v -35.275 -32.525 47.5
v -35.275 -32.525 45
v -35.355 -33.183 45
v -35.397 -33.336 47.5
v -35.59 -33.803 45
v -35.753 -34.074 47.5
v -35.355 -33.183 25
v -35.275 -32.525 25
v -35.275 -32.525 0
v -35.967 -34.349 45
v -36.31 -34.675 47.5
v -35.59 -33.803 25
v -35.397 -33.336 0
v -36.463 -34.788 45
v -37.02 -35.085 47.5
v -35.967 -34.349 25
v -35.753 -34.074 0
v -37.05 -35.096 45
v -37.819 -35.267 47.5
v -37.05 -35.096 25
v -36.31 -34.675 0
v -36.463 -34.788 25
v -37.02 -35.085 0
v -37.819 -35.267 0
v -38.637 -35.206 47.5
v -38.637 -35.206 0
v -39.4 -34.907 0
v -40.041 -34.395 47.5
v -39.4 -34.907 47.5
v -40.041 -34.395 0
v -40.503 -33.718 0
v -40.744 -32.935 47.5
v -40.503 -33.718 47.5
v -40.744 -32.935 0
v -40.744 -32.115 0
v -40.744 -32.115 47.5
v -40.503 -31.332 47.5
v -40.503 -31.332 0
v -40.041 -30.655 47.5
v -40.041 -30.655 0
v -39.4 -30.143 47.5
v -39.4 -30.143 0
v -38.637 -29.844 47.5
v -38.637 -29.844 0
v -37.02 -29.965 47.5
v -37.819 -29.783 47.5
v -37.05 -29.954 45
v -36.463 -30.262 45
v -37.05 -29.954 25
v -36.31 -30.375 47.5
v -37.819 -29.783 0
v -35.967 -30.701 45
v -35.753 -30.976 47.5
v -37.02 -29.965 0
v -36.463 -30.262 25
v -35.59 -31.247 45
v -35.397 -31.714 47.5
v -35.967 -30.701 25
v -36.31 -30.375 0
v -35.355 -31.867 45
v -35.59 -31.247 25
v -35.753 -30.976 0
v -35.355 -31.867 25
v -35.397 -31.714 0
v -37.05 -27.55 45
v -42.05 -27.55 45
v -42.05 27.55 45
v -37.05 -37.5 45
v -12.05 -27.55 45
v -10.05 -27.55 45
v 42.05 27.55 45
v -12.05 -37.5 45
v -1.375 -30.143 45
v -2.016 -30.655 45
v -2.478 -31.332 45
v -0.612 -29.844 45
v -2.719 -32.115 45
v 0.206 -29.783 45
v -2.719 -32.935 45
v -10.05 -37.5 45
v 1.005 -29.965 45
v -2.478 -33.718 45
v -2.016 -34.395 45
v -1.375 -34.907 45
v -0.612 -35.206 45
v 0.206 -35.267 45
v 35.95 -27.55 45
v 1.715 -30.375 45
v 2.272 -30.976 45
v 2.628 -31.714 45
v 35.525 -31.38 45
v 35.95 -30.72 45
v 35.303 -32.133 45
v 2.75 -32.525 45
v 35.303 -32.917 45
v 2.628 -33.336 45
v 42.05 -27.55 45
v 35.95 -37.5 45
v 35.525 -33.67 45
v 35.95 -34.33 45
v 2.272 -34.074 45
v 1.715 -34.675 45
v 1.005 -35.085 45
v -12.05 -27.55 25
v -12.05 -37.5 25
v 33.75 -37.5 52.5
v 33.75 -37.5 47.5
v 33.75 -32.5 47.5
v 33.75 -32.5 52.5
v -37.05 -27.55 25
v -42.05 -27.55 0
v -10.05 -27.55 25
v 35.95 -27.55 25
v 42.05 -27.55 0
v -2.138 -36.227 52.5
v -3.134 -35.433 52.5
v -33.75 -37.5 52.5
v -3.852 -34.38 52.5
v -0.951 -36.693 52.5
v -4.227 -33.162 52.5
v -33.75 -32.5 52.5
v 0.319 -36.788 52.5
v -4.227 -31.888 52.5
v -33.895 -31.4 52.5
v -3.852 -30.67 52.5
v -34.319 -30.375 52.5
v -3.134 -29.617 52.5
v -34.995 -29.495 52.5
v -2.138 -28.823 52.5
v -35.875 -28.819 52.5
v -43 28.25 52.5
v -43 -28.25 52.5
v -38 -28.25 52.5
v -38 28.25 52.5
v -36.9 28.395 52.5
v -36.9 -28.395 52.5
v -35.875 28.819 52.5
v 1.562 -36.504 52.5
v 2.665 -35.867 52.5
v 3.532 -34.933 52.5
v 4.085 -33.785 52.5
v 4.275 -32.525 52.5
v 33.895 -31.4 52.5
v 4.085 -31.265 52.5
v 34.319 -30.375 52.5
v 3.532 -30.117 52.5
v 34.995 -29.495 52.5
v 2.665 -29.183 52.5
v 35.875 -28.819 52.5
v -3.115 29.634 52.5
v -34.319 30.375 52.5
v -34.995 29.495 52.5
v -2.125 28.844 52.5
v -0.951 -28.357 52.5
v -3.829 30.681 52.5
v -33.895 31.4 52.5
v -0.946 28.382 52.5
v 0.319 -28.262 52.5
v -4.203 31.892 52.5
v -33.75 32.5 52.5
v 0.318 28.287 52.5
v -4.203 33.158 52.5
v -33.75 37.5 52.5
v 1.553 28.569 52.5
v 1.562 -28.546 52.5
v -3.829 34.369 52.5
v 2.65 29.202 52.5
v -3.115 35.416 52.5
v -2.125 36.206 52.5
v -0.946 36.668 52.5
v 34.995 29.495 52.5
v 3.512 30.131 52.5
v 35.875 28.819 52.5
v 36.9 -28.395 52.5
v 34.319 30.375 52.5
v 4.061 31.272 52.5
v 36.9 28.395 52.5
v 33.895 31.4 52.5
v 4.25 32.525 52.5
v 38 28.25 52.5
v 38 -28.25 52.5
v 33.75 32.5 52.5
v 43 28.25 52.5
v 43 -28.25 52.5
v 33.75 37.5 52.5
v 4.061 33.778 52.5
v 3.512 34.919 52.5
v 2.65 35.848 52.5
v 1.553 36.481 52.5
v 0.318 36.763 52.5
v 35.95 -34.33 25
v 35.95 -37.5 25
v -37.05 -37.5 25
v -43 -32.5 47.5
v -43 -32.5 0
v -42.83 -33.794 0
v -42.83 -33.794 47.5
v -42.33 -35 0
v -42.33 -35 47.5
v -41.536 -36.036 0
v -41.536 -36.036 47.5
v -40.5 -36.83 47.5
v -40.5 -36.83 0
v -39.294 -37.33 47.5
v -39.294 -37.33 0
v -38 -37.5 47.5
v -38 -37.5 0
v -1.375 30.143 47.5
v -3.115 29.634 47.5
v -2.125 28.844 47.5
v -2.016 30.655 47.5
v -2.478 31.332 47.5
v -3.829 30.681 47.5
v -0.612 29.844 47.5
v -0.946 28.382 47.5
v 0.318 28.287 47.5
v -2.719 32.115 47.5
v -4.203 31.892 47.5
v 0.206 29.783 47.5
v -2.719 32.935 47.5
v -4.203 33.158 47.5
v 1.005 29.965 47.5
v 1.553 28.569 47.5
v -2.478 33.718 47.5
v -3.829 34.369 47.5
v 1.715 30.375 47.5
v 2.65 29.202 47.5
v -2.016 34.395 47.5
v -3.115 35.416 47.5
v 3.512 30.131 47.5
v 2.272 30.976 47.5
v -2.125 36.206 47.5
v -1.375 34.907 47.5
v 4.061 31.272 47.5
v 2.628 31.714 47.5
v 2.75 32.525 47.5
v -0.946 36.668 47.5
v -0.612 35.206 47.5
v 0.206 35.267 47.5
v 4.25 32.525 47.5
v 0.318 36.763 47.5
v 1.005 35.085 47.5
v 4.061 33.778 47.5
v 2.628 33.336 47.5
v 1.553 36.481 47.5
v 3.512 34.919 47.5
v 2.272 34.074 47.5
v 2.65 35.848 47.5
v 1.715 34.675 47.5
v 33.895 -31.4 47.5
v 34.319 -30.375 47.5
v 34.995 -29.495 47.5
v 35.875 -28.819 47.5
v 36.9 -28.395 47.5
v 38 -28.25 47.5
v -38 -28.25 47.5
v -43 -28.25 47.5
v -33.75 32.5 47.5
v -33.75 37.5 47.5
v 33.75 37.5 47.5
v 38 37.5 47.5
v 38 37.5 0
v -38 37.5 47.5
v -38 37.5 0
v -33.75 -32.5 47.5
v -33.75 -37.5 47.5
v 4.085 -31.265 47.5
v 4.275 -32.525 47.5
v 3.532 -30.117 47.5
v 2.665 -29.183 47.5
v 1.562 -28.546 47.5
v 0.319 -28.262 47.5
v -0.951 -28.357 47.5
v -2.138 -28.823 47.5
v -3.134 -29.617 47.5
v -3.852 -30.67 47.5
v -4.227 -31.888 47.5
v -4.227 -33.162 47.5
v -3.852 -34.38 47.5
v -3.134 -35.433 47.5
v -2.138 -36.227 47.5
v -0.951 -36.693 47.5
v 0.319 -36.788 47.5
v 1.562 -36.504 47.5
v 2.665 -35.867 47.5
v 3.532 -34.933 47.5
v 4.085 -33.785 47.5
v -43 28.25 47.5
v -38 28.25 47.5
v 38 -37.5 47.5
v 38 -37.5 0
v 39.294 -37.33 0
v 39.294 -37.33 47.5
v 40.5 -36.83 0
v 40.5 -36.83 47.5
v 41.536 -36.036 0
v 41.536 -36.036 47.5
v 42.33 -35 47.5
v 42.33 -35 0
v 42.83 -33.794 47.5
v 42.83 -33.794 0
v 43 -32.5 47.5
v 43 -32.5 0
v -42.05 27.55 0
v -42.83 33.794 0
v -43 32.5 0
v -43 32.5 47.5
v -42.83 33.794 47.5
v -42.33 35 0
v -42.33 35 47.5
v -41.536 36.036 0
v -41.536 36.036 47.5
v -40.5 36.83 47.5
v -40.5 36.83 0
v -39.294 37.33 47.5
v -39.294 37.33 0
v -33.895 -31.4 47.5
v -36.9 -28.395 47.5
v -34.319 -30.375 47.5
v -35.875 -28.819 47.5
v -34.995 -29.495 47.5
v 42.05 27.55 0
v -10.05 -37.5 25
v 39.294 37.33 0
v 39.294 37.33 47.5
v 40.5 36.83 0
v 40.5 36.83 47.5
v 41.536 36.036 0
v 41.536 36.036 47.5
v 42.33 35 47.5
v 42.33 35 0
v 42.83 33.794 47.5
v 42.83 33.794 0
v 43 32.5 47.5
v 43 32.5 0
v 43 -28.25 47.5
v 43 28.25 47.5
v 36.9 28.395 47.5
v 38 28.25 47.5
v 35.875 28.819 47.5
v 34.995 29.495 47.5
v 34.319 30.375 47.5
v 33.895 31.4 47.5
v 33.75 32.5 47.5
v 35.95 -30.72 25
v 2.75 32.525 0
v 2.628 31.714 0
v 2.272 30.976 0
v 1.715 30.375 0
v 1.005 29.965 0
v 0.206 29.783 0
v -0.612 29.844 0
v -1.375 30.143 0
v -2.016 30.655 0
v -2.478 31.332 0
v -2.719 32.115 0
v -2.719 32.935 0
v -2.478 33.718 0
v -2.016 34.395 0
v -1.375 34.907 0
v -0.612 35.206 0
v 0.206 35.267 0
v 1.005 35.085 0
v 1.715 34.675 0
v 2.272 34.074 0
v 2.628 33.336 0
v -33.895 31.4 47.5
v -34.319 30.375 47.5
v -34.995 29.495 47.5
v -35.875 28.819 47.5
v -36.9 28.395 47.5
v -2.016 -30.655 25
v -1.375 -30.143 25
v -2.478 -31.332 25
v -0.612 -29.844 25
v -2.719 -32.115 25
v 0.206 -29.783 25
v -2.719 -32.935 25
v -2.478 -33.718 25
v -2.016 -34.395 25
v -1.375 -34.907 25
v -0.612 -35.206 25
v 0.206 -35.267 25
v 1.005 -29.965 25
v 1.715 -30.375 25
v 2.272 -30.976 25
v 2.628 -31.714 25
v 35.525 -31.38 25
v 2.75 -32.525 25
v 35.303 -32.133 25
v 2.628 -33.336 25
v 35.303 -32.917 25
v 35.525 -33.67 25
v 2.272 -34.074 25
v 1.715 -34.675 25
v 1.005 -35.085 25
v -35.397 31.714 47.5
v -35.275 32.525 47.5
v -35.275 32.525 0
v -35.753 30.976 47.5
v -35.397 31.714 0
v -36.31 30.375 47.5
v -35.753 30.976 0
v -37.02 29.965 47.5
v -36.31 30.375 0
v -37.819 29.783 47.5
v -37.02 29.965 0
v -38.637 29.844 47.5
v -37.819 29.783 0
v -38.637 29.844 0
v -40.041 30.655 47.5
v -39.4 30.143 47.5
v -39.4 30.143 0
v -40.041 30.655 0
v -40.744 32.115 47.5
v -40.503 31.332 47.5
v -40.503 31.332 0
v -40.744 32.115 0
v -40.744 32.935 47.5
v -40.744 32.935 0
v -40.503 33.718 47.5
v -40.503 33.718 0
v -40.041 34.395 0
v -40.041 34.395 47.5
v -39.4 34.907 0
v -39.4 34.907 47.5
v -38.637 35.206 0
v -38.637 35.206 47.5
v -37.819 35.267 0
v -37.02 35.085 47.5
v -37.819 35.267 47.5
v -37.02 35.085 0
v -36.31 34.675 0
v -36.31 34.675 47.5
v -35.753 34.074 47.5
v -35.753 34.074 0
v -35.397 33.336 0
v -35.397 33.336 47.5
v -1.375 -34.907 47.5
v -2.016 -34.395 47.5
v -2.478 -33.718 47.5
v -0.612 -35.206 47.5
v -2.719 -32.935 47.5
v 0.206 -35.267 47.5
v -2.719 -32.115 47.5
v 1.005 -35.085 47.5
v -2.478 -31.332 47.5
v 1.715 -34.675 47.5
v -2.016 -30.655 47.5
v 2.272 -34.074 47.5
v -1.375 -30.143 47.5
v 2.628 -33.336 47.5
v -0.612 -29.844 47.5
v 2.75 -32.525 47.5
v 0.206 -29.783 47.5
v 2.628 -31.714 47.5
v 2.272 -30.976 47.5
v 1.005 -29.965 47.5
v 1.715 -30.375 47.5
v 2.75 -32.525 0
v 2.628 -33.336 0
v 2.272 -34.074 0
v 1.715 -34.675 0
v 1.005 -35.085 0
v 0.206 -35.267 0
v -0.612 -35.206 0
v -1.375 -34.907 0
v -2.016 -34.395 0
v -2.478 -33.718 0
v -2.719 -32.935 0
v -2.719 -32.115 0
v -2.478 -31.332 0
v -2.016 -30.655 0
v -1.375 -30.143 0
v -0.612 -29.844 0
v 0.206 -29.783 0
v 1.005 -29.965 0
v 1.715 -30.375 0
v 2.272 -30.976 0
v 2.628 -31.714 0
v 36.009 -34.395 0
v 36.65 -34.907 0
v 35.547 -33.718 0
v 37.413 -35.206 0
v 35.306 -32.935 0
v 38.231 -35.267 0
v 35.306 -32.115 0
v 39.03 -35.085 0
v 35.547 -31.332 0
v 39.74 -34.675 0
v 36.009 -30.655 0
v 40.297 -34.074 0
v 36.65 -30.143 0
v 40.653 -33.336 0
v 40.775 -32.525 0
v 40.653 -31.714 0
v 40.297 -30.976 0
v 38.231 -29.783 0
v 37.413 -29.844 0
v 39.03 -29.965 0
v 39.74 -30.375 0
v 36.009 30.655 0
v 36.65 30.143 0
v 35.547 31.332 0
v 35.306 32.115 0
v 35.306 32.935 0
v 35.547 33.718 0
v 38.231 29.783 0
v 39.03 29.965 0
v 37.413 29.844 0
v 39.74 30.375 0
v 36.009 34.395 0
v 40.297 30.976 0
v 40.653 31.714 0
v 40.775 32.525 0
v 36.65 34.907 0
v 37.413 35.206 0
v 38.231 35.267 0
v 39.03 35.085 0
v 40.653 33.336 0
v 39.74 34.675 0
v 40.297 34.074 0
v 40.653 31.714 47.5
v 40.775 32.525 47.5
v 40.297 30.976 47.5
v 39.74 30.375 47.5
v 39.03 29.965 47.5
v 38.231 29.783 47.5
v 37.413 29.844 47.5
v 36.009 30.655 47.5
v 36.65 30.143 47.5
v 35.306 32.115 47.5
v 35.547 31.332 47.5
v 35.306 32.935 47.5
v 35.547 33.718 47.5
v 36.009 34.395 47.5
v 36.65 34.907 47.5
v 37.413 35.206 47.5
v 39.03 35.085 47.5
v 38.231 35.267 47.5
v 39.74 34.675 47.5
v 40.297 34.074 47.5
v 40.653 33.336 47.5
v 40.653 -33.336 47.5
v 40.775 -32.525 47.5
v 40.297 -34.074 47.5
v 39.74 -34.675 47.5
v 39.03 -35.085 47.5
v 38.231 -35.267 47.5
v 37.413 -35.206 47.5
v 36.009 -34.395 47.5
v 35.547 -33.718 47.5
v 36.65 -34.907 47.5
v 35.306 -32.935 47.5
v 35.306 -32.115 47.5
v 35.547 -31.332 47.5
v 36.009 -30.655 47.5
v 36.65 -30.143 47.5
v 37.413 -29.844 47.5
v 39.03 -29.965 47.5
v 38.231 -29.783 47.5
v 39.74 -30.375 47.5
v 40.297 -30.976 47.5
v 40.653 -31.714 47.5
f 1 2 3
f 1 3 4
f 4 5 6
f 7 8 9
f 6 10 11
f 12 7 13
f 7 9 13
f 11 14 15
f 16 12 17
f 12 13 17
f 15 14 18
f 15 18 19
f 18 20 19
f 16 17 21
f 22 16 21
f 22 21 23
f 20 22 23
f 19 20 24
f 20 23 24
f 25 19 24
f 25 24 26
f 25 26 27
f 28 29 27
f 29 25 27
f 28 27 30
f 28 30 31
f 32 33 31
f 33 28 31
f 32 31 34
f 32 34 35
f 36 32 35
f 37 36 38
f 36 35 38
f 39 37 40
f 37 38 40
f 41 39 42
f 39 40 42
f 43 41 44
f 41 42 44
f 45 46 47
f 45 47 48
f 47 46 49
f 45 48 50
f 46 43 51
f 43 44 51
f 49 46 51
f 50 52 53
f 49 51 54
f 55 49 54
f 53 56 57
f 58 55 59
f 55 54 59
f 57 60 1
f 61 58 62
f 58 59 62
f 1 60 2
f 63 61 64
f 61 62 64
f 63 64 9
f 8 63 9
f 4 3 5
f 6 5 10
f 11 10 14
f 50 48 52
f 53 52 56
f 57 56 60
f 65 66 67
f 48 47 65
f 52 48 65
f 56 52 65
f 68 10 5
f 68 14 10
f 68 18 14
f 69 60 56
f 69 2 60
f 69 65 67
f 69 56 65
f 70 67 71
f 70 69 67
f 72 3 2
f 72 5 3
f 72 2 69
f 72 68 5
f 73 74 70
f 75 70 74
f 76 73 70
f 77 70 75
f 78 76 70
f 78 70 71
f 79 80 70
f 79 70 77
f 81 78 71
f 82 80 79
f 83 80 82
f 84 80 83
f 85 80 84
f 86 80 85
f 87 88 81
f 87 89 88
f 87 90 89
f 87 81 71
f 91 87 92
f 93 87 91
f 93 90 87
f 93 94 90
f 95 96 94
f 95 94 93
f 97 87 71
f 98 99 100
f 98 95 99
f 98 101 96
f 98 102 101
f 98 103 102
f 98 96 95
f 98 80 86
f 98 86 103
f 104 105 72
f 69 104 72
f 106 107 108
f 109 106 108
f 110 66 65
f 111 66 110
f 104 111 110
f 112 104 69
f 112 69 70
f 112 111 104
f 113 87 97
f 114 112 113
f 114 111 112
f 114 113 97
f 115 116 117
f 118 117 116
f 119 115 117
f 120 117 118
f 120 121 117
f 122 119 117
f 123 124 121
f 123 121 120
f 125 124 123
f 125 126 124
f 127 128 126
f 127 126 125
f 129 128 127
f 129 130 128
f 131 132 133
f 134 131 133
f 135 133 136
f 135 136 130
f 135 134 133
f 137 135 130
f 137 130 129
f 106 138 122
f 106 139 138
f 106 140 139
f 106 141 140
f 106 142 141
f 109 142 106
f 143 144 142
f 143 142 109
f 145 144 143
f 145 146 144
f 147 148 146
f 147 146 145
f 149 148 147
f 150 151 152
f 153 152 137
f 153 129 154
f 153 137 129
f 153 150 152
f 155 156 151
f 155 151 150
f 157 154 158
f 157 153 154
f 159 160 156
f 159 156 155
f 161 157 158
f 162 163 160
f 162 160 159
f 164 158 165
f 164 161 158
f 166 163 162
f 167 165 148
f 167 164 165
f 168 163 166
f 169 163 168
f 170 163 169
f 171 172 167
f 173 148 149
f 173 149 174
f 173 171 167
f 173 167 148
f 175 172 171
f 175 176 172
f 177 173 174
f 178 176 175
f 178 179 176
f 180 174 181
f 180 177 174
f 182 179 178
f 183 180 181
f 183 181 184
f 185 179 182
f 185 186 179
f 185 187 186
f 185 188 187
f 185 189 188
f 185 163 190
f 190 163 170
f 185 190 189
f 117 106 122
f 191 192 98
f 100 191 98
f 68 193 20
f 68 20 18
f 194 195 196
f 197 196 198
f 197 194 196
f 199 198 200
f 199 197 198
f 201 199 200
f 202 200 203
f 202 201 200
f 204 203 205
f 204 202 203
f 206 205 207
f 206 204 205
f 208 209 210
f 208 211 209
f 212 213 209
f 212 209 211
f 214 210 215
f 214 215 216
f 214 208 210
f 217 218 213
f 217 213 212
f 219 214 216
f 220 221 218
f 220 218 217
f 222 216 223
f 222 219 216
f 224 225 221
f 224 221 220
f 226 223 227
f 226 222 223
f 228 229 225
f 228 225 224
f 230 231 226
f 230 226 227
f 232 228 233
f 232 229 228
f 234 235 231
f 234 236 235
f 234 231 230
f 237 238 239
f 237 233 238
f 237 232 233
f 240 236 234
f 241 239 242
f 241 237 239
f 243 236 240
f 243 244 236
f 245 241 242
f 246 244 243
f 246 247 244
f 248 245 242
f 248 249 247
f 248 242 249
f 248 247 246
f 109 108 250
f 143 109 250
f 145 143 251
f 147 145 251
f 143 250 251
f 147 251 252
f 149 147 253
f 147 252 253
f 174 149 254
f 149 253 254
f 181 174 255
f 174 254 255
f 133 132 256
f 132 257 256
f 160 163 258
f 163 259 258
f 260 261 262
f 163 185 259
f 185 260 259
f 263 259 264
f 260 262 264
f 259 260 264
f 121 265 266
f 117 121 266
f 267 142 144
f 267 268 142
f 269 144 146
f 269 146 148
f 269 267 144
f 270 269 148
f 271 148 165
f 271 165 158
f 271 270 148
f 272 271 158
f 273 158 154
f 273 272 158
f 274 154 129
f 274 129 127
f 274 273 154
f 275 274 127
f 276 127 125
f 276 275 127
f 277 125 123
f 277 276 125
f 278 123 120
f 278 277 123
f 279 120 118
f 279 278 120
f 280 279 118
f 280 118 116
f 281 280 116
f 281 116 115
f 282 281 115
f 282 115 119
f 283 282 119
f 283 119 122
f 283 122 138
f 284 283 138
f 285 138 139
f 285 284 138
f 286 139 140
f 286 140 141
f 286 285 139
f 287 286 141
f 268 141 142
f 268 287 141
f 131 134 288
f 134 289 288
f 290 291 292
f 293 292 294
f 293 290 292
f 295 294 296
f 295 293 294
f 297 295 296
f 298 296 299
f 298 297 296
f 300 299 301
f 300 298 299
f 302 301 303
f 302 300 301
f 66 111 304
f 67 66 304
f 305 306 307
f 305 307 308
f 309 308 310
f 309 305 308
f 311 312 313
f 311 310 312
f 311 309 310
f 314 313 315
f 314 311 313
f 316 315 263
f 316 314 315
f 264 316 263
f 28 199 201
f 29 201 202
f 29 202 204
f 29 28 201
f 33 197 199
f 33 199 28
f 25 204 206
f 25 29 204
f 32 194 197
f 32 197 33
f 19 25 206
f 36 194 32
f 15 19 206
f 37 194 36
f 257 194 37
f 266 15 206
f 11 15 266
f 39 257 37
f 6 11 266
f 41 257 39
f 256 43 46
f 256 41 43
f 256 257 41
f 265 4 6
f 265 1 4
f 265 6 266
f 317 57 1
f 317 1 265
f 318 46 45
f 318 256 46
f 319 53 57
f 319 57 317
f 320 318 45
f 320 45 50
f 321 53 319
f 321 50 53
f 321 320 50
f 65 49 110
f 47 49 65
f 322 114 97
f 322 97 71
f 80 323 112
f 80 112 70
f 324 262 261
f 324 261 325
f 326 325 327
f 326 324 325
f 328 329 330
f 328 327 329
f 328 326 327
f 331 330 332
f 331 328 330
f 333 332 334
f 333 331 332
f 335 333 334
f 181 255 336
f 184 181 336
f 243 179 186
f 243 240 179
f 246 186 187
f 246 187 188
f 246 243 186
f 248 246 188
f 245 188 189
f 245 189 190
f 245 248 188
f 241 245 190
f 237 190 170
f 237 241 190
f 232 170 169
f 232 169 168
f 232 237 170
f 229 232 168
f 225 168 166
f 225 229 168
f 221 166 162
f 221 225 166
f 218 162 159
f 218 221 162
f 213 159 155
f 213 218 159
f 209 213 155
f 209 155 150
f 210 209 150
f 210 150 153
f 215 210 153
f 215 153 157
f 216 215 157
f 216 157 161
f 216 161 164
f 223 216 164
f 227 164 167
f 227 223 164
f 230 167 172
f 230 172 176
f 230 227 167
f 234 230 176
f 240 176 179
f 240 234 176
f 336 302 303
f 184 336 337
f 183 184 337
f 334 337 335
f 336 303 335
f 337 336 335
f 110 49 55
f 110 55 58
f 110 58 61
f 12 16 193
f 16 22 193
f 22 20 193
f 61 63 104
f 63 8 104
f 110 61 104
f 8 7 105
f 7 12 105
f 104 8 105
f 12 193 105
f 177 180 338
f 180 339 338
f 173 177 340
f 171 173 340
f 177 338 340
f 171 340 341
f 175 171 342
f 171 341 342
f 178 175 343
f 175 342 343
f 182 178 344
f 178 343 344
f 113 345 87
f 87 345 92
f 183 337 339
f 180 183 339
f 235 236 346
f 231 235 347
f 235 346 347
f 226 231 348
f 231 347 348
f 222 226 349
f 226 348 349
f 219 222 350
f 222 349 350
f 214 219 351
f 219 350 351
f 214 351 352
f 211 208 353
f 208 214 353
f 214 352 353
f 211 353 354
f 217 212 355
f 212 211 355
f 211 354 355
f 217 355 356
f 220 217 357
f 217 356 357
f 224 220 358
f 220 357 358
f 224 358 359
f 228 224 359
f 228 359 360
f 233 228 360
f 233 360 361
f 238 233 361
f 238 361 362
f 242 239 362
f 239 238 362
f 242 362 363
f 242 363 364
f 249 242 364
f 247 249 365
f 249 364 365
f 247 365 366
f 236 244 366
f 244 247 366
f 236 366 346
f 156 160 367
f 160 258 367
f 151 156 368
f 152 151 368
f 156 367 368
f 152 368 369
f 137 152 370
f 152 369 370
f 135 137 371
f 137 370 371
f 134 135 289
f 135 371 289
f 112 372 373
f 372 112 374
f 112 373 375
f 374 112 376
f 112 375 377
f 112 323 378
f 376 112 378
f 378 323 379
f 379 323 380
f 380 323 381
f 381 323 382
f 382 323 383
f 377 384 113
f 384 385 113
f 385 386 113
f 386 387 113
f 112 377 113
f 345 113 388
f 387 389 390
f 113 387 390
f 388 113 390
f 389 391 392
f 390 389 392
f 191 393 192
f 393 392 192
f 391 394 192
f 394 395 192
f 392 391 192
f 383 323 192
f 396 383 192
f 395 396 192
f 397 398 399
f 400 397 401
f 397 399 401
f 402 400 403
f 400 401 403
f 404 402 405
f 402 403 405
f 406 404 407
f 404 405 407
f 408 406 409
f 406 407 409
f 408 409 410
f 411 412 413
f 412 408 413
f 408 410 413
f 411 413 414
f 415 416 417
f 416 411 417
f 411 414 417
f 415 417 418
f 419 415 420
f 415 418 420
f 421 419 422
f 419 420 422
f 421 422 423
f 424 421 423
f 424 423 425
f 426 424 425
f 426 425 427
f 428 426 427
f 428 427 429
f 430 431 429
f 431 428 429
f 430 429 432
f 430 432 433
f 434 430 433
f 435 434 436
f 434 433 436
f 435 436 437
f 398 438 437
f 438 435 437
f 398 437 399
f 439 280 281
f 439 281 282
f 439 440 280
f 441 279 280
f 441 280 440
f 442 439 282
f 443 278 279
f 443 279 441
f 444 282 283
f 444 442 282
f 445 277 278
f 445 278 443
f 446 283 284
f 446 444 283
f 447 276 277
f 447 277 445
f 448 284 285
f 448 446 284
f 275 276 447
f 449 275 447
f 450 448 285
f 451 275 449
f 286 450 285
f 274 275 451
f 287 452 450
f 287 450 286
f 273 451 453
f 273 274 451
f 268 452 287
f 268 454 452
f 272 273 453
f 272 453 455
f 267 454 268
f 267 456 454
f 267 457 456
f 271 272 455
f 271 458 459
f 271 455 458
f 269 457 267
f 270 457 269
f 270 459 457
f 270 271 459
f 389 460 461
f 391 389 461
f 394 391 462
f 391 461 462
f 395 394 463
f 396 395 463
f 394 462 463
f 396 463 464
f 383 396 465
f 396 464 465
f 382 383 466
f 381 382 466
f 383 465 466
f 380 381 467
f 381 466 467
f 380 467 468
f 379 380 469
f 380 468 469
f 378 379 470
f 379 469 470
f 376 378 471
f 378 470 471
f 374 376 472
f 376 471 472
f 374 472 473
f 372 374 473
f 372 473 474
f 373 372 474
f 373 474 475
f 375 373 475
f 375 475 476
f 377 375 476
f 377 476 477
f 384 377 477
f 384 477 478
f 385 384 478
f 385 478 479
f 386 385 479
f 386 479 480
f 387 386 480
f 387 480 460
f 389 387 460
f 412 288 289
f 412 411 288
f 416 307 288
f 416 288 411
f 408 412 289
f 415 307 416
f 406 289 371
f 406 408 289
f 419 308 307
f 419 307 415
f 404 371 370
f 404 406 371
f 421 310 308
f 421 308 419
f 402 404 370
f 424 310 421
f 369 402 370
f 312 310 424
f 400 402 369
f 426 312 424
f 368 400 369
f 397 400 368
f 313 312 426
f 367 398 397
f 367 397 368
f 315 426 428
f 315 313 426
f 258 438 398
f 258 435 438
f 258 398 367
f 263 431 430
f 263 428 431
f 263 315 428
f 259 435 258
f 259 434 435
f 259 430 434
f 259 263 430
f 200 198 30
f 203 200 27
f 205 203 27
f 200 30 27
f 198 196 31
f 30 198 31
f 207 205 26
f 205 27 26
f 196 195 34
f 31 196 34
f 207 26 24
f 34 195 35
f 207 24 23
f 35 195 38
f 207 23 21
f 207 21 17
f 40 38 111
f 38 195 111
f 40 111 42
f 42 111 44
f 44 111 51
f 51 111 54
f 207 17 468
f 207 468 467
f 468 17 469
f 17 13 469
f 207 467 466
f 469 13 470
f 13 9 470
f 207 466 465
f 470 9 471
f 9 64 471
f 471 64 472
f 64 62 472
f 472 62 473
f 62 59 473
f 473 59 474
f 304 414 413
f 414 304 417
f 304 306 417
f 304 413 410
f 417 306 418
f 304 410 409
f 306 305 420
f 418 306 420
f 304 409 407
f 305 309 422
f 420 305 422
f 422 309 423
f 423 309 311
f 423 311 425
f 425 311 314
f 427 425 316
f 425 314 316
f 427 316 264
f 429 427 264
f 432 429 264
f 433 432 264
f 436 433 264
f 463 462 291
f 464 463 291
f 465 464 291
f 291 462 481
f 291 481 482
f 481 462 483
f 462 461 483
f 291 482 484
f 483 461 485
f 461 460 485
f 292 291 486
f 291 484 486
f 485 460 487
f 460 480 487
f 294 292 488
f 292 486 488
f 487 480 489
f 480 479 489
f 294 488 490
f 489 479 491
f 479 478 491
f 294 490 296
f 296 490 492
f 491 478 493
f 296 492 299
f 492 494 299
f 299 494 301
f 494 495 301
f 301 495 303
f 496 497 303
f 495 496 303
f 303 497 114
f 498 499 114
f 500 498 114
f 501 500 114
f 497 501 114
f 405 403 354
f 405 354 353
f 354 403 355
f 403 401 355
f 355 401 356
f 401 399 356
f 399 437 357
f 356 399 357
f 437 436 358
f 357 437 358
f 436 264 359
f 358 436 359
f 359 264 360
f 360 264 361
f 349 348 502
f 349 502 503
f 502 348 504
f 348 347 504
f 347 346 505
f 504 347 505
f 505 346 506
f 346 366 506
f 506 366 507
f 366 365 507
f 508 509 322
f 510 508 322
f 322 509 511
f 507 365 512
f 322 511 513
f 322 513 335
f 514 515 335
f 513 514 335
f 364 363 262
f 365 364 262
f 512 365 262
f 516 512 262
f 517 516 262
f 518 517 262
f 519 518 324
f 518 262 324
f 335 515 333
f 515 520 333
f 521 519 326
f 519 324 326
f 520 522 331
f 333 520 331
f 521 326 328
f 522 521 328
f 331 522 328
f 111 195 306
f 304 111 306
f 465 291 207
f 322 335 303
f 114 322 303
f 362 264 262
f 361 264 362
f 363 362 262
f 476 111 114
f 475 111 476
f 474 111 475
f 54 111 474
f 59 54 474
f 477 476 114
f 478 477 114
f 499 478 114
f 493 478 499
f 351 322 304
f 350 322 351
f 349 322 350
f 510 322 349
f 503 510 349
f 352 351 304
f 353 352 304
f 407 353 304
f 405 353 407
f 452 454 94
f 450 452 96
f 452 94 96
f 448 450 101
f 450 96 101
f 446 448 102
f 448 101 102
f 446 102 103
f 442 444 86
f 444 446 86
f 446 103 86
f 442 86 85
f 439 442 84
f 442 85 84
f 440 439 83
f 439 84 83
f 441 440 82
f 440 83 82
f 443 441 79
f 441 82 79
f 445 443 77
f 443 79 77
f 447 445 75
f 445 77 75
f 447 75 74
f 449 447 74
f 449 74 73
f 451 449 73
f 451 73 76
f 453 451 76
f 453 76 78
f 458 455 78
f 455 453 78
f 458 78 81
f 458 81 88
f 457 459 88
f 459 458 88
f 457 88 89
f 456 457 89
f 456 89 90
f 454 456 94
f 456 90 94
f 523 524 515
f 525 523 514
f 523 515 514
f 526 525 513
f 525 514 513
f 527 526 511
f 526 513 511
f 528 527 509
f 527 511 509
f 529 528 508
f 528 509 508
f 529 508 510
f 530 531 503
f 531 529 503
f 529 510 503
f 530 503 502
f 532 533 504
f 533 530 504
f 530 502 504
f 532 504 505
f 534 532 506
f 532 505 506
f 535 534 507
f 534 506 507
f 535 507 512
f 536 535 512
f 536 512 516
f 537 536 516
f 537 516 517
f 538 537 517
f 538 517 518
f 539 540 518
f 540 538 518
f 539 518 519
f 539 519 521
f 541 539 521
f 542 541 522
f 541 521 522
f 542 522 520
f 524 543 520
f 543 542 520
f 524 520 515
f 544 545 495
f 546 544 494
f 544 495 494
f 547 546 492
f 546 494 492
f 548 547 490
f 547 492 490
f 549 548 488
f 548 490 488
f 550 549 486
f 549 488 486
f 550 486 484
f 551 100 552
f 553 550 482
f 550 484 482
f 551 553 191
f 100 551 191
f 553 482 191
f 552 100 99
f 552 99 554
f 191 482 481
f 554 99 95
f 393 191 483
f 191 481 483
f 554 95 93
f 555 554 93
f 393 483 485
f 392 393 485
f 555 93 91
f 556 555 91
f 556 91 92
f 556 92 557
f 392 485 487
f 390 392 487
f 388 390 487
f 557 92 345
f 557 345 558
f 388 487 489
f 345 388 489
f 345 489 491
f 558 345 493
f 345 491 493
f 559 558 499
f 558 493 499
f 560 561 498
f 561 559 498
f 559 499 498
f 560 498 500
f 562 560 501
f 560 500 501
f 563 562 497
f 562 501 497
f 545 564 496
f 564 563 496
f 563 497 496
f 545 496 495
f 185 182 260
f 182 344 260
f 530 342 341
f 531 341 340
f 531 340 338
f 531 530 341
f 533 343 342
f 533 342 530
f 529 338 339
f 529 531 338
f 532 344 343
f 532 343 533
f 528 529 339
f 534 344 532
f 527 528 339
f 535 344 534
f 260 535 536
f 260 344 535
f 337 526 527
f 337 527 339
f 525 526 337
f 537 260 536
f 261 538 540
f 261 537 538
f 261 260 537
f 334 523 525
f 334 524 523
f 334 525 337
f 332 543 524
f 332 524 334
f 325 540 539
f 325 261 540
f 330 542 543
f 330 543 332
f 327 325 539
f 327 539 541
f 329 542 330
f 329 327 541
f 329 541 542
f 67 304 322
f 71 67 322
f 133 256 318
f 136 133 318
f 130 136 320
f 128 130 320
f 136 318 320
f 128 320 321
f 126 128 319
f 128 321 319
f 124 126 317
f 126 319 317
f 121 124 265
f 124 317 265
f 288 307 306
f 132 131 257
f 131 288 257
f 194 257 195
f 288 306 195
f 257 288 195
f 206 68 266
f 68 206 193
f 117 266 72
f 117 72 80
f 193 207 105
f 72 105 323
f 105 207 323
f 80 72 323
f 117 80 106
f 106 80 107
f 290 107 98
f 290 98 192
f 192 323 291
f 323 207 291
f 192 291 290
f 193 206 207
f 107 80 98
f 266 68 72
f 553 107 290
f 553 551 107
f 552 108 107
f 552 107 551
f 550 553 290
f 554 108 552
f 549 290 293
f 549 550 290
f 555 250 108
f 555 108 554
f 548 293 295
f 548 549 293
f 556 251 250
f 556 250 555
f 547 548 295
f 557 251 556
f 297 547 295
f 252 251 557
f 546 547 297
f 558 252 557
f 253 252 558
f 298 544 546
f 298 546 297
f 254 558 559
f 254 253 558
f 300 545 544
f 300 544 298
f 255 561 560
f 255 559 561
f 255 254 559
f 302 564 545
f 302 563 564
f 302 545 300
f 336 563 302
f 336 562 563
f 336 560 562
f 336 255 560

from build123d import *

# Parameters (mm, degrees)
F0_W      = 86
F0_H      = 75
F0_W_2    = 84.1
F0_H_2    = 55.1
F1_DEPTH  = 45
F2_W      = 86
F2_H      = 75
F2_W_2    = 84.1
F2_H_2    = 55.1
F3_DEPTH  = 5
F4_W      = 25
F4_H      = 20
F4_W_2    = 46
F5_DEPTH  = 25
F6_R      = 2.75
F7_DEPTH  = 50.001
F8_R      = 5
F9_R      = 2.75
F9_R_2    = 4.275
F9_R_3    = 4.25
F10_DEPTH = 2.5
F11_R     = 4.275
F11_R_2   = 4.25
F12_DEPTH = 2.5


with BuildPart() as f1:
    # F0 (on Top) → F1 (new body)
    with BuildSketch(Plane.XY):
        Rectangle(F0_W, F0_H)
        Rectangle(F0_W_2, F0_H_2, mode=Mode.SUBTRACT)
    extrude(amount=F1_DEPTH)

    # F2 (on face) → F3 (join)
    with BuildSketch(Plane.XY.offset(45)):
        Rectangle(F2_W, F2_H)
        Rectangle(F2_W_2, F2_H_2, mode=Mode.SUBTRACT)
        Rectangle(F2_W_2, F2_H_2)
    extrude(amount=F3_DEPTH)

    # F4 (on face) → F5 (cut)
    with BuildSketch(Plane.XZ.offset(37.5)):
        with Locations((-24.55, 35)):
            Rectangle(F4_W, F4_H)
        with Locations((12.95, 35)):
            Rectangle(F4_W_2, F4_H)
    extrude(amount=-F5_DEPTH, mode=Mode.SUBTRACT)

    # F6 (on face) → F7 (cut, through all)
    with BuildSketch(Plane(origin=(0, 0, 0), x_dir=(1, 0, 0), z_dir=(0, 0, -1))):
        with Locations((-38.025, 32.525)):
            Circle(F6_R)
        with Locations((0, 32.525)):
            Circle(F6_R)
        with Locations((38.025, 32.525)):
            Circle(F6_R)
        with Locations((38.025, -32.525)):
            Circle(F6_R)
        with Locations((0, -32.525)):
            Circle(F6_R)
        with Locations((-38.025, -32.525)):
            Circle(F6_R)
    extrude(amount=-F7_DEPTH, mode=Mode.SUBTRACT)

    # F8
    f8_edges = [f1.edges().sort_by_distance(p)[0] for p in [
        (43, -37.5, 25),
        (43, 37.5, 25),
        (-43, 37.5, 25),
        (-43, -37.5, 25),
    ]]
    fillet(f8_edges, radius=F8_R)

    # F9 (on face) → F10 (cut)
    with BuildSketch(Plane.XY.offset(50)):
        with BuildLine():
            Line((-38, -37.5), (-33.75, -37.5))
            Line((-33.75, -37.5), (-33.75, -32.5))
            ThreePointArc((-33.75, -32.5), (-41.00520382, -35.50520382), (-38, -28.25))
            Line((-38, -28.25), (-43, -28.25))
            Line((-43, -28.25), (-43, -32.5))
            ThreePointArc((-43, -32.5), (-41.5355339059, -36.0355339059), (-38, -37.5))
        make_face()
        with BuildLine():
            ThreePointArc((-38, -28.25), (-41.00520382, -35.50520382), (-33.75, -32.5))
            ThreePointArc((-33.75, -32.5), (-34.99479618, -29.49479618), (-38, -28.25))
        make_face()
        with Locations((-38.025, -32.525)):
            Circle(F9_R, mode=Mode.SUBTRACT)
        with Locations((0, -32.525)):
            Circle(F9_R_2)
        with Locations((0, -32.525)):
            Circle(F9_R, mode=Mode.SUBTRACT)
        with BuildLine():
            ThreePointArc((38, -37.5), (41.5355339059, -36.0355339059), (43, -32.5))
            Line((43, -32.5), (43, -28.25))
            Line((43, -28.25), (38, -28.25))
            ThreePointArc((38, -28.25), (41.00520382, -29.49479618), (42.25, -32.5))
            ThreePointArc((42.25, -32.5), (38, -36.75), (33.75, -32.5))
            Line((33.75, -32.5), (33.75, -37.5))
            Line((33.75, -37.5), (38, -37.5))
        make_face()
        with BuildLine():
            ThreePointArc((42.25, -32.5), (41.00520382, -29.49479618), (38, -28.25))
            ThreePointArc((38, -28.25), (34.99479618, -29.49479618), (33.75, -32.5))
            ThreePointArc((33.75, -32.5), (38, -36.75), (42.25, -32.5))
        make_face()
        with Locations((38.025, -32.525)):
            Circle(F9_R, mode=Mode.SUBTRACT)
        with Locations((0, 32.525)):
            Circle(F9_R_3)
        with Locations((0, 32.525)):
            Circle(F9_R, mode=Mode.SUBTRACT)
        with BuildLine():
            Line((-33.75, 32.5), (-33.75, 37.5))
            Line((-33.75, 37.5), (-38, 37.5))
            ThreePointArc((-38, 37.5), (-41.5355339059, 36.0355339059), (-43, 32.5))
            Line((-43, 32.5), (-43, 28.25))
            Line((-43, 28.25), (-38, 28.25))
            ThreePointArc((-38, 28.25), (-41.00520382, 35.50520382), (-33.75, 32.5))
        make_face()
        with BuildLine():
            ThreePointArc((-38, 28.25), (-34.99479618, 29.49479618), (-33.75, 32.5))
            ThreePointArc((-33.75, 32.5), (-41.00520382, 35.50520382), (-38, 28.25))
        make_face()
        with Locations((-38.025, 32.525)):
            Circle(F9_R, mode=Mode.SUBTRACT)
        with BuildLine():
            Line((38, 28.25), (43, 28.25))
            Line((43, 28.25), (43, 32.5))
            ThreePointArc((43, 32.5), (41.5355339059, 36.0355339059), (38, 37.5))
            Line((38, 37.5), (33.75, 37.5))
            Line((33.75, 37.5), (33.75, 32.5))
            ThreePointArc((33.75, 32.5), (38, 36.75), (42.25, 32.5))
            ThreePointArc((42.25, 32.5), (41.00520382, 29.49479618), (38, 28.25))
        make_face()
        with BuildLine():
            ThreePointArc((33.75, 32.5), (34.99479618, 29.49479618), (38, 28.25))
            ThreePointArc((38, 28.25), (41.00520382, 29.49479618), (42.25, 32.5))
            ThreePointArc((42.25, 32.5), (38, 36.75), (33.75, 32.5))
        make_face()
        with Locations((38.025, 32.525)):
            Circle(F9_R, mode=Mode.SUBTRACT)
    extrude(amount=-F10_DEPTH, mode=Mode.SUBTRACT)

    # F11 (on face) → F12 (join)
    with BuildSketch(Plane.XY.offset(50)):
        with BuildLine():
            Line((43, 28.25), (38, 28.25))
            ThreePointArc((38, 28.25), (34.99479618, 29.49479618), (33.75, 32.5))
            Line((33.75, 32.5), (33.75, 37.5))
            Line((33.75, 37.5), (-33.75, 37.5))
            Line((-33.75, 37.5), (-33.75, 32.5))
            ThreePointArc((-33.75, 32.5), (-34.99479618, 29.49479618), (-38, 28.25))
            Line((-38, 28.25), (-43, 28.25))
            Line((-43, 28.25), (-43, -28.25))
            Line((-43, -28.25), (-38, -28.25))
            ThreePointArc((-38, -28.25), (-34.99479618, -29.49479618), (-33.75, -32.5))
            Line((-33.75, -32.5), (-33.75, -37.5))
            Line((-33.75, -37.5), (33.75, -37.5))
            Line((33.75, -37.5), (33.75, -32.5))
            ThreePointArc((33.75, -32.5), (34.99479618, -29.49479618), (38, -28.25))
            Line((38, -28.25), (43, -28.25))
            Line((43, -28.25), (43, 28.25))
        make_face()
        with Locations((0, -32.525)):
            Circle(F11_R, mode=Mode.SUBTRACT)
        with Locations((0, 32.525)):
            Circle(F11_R_2, mode=Mode.SUBTRACT)
    extrude(amount=F12_DEPTH)


solid = f1.part
